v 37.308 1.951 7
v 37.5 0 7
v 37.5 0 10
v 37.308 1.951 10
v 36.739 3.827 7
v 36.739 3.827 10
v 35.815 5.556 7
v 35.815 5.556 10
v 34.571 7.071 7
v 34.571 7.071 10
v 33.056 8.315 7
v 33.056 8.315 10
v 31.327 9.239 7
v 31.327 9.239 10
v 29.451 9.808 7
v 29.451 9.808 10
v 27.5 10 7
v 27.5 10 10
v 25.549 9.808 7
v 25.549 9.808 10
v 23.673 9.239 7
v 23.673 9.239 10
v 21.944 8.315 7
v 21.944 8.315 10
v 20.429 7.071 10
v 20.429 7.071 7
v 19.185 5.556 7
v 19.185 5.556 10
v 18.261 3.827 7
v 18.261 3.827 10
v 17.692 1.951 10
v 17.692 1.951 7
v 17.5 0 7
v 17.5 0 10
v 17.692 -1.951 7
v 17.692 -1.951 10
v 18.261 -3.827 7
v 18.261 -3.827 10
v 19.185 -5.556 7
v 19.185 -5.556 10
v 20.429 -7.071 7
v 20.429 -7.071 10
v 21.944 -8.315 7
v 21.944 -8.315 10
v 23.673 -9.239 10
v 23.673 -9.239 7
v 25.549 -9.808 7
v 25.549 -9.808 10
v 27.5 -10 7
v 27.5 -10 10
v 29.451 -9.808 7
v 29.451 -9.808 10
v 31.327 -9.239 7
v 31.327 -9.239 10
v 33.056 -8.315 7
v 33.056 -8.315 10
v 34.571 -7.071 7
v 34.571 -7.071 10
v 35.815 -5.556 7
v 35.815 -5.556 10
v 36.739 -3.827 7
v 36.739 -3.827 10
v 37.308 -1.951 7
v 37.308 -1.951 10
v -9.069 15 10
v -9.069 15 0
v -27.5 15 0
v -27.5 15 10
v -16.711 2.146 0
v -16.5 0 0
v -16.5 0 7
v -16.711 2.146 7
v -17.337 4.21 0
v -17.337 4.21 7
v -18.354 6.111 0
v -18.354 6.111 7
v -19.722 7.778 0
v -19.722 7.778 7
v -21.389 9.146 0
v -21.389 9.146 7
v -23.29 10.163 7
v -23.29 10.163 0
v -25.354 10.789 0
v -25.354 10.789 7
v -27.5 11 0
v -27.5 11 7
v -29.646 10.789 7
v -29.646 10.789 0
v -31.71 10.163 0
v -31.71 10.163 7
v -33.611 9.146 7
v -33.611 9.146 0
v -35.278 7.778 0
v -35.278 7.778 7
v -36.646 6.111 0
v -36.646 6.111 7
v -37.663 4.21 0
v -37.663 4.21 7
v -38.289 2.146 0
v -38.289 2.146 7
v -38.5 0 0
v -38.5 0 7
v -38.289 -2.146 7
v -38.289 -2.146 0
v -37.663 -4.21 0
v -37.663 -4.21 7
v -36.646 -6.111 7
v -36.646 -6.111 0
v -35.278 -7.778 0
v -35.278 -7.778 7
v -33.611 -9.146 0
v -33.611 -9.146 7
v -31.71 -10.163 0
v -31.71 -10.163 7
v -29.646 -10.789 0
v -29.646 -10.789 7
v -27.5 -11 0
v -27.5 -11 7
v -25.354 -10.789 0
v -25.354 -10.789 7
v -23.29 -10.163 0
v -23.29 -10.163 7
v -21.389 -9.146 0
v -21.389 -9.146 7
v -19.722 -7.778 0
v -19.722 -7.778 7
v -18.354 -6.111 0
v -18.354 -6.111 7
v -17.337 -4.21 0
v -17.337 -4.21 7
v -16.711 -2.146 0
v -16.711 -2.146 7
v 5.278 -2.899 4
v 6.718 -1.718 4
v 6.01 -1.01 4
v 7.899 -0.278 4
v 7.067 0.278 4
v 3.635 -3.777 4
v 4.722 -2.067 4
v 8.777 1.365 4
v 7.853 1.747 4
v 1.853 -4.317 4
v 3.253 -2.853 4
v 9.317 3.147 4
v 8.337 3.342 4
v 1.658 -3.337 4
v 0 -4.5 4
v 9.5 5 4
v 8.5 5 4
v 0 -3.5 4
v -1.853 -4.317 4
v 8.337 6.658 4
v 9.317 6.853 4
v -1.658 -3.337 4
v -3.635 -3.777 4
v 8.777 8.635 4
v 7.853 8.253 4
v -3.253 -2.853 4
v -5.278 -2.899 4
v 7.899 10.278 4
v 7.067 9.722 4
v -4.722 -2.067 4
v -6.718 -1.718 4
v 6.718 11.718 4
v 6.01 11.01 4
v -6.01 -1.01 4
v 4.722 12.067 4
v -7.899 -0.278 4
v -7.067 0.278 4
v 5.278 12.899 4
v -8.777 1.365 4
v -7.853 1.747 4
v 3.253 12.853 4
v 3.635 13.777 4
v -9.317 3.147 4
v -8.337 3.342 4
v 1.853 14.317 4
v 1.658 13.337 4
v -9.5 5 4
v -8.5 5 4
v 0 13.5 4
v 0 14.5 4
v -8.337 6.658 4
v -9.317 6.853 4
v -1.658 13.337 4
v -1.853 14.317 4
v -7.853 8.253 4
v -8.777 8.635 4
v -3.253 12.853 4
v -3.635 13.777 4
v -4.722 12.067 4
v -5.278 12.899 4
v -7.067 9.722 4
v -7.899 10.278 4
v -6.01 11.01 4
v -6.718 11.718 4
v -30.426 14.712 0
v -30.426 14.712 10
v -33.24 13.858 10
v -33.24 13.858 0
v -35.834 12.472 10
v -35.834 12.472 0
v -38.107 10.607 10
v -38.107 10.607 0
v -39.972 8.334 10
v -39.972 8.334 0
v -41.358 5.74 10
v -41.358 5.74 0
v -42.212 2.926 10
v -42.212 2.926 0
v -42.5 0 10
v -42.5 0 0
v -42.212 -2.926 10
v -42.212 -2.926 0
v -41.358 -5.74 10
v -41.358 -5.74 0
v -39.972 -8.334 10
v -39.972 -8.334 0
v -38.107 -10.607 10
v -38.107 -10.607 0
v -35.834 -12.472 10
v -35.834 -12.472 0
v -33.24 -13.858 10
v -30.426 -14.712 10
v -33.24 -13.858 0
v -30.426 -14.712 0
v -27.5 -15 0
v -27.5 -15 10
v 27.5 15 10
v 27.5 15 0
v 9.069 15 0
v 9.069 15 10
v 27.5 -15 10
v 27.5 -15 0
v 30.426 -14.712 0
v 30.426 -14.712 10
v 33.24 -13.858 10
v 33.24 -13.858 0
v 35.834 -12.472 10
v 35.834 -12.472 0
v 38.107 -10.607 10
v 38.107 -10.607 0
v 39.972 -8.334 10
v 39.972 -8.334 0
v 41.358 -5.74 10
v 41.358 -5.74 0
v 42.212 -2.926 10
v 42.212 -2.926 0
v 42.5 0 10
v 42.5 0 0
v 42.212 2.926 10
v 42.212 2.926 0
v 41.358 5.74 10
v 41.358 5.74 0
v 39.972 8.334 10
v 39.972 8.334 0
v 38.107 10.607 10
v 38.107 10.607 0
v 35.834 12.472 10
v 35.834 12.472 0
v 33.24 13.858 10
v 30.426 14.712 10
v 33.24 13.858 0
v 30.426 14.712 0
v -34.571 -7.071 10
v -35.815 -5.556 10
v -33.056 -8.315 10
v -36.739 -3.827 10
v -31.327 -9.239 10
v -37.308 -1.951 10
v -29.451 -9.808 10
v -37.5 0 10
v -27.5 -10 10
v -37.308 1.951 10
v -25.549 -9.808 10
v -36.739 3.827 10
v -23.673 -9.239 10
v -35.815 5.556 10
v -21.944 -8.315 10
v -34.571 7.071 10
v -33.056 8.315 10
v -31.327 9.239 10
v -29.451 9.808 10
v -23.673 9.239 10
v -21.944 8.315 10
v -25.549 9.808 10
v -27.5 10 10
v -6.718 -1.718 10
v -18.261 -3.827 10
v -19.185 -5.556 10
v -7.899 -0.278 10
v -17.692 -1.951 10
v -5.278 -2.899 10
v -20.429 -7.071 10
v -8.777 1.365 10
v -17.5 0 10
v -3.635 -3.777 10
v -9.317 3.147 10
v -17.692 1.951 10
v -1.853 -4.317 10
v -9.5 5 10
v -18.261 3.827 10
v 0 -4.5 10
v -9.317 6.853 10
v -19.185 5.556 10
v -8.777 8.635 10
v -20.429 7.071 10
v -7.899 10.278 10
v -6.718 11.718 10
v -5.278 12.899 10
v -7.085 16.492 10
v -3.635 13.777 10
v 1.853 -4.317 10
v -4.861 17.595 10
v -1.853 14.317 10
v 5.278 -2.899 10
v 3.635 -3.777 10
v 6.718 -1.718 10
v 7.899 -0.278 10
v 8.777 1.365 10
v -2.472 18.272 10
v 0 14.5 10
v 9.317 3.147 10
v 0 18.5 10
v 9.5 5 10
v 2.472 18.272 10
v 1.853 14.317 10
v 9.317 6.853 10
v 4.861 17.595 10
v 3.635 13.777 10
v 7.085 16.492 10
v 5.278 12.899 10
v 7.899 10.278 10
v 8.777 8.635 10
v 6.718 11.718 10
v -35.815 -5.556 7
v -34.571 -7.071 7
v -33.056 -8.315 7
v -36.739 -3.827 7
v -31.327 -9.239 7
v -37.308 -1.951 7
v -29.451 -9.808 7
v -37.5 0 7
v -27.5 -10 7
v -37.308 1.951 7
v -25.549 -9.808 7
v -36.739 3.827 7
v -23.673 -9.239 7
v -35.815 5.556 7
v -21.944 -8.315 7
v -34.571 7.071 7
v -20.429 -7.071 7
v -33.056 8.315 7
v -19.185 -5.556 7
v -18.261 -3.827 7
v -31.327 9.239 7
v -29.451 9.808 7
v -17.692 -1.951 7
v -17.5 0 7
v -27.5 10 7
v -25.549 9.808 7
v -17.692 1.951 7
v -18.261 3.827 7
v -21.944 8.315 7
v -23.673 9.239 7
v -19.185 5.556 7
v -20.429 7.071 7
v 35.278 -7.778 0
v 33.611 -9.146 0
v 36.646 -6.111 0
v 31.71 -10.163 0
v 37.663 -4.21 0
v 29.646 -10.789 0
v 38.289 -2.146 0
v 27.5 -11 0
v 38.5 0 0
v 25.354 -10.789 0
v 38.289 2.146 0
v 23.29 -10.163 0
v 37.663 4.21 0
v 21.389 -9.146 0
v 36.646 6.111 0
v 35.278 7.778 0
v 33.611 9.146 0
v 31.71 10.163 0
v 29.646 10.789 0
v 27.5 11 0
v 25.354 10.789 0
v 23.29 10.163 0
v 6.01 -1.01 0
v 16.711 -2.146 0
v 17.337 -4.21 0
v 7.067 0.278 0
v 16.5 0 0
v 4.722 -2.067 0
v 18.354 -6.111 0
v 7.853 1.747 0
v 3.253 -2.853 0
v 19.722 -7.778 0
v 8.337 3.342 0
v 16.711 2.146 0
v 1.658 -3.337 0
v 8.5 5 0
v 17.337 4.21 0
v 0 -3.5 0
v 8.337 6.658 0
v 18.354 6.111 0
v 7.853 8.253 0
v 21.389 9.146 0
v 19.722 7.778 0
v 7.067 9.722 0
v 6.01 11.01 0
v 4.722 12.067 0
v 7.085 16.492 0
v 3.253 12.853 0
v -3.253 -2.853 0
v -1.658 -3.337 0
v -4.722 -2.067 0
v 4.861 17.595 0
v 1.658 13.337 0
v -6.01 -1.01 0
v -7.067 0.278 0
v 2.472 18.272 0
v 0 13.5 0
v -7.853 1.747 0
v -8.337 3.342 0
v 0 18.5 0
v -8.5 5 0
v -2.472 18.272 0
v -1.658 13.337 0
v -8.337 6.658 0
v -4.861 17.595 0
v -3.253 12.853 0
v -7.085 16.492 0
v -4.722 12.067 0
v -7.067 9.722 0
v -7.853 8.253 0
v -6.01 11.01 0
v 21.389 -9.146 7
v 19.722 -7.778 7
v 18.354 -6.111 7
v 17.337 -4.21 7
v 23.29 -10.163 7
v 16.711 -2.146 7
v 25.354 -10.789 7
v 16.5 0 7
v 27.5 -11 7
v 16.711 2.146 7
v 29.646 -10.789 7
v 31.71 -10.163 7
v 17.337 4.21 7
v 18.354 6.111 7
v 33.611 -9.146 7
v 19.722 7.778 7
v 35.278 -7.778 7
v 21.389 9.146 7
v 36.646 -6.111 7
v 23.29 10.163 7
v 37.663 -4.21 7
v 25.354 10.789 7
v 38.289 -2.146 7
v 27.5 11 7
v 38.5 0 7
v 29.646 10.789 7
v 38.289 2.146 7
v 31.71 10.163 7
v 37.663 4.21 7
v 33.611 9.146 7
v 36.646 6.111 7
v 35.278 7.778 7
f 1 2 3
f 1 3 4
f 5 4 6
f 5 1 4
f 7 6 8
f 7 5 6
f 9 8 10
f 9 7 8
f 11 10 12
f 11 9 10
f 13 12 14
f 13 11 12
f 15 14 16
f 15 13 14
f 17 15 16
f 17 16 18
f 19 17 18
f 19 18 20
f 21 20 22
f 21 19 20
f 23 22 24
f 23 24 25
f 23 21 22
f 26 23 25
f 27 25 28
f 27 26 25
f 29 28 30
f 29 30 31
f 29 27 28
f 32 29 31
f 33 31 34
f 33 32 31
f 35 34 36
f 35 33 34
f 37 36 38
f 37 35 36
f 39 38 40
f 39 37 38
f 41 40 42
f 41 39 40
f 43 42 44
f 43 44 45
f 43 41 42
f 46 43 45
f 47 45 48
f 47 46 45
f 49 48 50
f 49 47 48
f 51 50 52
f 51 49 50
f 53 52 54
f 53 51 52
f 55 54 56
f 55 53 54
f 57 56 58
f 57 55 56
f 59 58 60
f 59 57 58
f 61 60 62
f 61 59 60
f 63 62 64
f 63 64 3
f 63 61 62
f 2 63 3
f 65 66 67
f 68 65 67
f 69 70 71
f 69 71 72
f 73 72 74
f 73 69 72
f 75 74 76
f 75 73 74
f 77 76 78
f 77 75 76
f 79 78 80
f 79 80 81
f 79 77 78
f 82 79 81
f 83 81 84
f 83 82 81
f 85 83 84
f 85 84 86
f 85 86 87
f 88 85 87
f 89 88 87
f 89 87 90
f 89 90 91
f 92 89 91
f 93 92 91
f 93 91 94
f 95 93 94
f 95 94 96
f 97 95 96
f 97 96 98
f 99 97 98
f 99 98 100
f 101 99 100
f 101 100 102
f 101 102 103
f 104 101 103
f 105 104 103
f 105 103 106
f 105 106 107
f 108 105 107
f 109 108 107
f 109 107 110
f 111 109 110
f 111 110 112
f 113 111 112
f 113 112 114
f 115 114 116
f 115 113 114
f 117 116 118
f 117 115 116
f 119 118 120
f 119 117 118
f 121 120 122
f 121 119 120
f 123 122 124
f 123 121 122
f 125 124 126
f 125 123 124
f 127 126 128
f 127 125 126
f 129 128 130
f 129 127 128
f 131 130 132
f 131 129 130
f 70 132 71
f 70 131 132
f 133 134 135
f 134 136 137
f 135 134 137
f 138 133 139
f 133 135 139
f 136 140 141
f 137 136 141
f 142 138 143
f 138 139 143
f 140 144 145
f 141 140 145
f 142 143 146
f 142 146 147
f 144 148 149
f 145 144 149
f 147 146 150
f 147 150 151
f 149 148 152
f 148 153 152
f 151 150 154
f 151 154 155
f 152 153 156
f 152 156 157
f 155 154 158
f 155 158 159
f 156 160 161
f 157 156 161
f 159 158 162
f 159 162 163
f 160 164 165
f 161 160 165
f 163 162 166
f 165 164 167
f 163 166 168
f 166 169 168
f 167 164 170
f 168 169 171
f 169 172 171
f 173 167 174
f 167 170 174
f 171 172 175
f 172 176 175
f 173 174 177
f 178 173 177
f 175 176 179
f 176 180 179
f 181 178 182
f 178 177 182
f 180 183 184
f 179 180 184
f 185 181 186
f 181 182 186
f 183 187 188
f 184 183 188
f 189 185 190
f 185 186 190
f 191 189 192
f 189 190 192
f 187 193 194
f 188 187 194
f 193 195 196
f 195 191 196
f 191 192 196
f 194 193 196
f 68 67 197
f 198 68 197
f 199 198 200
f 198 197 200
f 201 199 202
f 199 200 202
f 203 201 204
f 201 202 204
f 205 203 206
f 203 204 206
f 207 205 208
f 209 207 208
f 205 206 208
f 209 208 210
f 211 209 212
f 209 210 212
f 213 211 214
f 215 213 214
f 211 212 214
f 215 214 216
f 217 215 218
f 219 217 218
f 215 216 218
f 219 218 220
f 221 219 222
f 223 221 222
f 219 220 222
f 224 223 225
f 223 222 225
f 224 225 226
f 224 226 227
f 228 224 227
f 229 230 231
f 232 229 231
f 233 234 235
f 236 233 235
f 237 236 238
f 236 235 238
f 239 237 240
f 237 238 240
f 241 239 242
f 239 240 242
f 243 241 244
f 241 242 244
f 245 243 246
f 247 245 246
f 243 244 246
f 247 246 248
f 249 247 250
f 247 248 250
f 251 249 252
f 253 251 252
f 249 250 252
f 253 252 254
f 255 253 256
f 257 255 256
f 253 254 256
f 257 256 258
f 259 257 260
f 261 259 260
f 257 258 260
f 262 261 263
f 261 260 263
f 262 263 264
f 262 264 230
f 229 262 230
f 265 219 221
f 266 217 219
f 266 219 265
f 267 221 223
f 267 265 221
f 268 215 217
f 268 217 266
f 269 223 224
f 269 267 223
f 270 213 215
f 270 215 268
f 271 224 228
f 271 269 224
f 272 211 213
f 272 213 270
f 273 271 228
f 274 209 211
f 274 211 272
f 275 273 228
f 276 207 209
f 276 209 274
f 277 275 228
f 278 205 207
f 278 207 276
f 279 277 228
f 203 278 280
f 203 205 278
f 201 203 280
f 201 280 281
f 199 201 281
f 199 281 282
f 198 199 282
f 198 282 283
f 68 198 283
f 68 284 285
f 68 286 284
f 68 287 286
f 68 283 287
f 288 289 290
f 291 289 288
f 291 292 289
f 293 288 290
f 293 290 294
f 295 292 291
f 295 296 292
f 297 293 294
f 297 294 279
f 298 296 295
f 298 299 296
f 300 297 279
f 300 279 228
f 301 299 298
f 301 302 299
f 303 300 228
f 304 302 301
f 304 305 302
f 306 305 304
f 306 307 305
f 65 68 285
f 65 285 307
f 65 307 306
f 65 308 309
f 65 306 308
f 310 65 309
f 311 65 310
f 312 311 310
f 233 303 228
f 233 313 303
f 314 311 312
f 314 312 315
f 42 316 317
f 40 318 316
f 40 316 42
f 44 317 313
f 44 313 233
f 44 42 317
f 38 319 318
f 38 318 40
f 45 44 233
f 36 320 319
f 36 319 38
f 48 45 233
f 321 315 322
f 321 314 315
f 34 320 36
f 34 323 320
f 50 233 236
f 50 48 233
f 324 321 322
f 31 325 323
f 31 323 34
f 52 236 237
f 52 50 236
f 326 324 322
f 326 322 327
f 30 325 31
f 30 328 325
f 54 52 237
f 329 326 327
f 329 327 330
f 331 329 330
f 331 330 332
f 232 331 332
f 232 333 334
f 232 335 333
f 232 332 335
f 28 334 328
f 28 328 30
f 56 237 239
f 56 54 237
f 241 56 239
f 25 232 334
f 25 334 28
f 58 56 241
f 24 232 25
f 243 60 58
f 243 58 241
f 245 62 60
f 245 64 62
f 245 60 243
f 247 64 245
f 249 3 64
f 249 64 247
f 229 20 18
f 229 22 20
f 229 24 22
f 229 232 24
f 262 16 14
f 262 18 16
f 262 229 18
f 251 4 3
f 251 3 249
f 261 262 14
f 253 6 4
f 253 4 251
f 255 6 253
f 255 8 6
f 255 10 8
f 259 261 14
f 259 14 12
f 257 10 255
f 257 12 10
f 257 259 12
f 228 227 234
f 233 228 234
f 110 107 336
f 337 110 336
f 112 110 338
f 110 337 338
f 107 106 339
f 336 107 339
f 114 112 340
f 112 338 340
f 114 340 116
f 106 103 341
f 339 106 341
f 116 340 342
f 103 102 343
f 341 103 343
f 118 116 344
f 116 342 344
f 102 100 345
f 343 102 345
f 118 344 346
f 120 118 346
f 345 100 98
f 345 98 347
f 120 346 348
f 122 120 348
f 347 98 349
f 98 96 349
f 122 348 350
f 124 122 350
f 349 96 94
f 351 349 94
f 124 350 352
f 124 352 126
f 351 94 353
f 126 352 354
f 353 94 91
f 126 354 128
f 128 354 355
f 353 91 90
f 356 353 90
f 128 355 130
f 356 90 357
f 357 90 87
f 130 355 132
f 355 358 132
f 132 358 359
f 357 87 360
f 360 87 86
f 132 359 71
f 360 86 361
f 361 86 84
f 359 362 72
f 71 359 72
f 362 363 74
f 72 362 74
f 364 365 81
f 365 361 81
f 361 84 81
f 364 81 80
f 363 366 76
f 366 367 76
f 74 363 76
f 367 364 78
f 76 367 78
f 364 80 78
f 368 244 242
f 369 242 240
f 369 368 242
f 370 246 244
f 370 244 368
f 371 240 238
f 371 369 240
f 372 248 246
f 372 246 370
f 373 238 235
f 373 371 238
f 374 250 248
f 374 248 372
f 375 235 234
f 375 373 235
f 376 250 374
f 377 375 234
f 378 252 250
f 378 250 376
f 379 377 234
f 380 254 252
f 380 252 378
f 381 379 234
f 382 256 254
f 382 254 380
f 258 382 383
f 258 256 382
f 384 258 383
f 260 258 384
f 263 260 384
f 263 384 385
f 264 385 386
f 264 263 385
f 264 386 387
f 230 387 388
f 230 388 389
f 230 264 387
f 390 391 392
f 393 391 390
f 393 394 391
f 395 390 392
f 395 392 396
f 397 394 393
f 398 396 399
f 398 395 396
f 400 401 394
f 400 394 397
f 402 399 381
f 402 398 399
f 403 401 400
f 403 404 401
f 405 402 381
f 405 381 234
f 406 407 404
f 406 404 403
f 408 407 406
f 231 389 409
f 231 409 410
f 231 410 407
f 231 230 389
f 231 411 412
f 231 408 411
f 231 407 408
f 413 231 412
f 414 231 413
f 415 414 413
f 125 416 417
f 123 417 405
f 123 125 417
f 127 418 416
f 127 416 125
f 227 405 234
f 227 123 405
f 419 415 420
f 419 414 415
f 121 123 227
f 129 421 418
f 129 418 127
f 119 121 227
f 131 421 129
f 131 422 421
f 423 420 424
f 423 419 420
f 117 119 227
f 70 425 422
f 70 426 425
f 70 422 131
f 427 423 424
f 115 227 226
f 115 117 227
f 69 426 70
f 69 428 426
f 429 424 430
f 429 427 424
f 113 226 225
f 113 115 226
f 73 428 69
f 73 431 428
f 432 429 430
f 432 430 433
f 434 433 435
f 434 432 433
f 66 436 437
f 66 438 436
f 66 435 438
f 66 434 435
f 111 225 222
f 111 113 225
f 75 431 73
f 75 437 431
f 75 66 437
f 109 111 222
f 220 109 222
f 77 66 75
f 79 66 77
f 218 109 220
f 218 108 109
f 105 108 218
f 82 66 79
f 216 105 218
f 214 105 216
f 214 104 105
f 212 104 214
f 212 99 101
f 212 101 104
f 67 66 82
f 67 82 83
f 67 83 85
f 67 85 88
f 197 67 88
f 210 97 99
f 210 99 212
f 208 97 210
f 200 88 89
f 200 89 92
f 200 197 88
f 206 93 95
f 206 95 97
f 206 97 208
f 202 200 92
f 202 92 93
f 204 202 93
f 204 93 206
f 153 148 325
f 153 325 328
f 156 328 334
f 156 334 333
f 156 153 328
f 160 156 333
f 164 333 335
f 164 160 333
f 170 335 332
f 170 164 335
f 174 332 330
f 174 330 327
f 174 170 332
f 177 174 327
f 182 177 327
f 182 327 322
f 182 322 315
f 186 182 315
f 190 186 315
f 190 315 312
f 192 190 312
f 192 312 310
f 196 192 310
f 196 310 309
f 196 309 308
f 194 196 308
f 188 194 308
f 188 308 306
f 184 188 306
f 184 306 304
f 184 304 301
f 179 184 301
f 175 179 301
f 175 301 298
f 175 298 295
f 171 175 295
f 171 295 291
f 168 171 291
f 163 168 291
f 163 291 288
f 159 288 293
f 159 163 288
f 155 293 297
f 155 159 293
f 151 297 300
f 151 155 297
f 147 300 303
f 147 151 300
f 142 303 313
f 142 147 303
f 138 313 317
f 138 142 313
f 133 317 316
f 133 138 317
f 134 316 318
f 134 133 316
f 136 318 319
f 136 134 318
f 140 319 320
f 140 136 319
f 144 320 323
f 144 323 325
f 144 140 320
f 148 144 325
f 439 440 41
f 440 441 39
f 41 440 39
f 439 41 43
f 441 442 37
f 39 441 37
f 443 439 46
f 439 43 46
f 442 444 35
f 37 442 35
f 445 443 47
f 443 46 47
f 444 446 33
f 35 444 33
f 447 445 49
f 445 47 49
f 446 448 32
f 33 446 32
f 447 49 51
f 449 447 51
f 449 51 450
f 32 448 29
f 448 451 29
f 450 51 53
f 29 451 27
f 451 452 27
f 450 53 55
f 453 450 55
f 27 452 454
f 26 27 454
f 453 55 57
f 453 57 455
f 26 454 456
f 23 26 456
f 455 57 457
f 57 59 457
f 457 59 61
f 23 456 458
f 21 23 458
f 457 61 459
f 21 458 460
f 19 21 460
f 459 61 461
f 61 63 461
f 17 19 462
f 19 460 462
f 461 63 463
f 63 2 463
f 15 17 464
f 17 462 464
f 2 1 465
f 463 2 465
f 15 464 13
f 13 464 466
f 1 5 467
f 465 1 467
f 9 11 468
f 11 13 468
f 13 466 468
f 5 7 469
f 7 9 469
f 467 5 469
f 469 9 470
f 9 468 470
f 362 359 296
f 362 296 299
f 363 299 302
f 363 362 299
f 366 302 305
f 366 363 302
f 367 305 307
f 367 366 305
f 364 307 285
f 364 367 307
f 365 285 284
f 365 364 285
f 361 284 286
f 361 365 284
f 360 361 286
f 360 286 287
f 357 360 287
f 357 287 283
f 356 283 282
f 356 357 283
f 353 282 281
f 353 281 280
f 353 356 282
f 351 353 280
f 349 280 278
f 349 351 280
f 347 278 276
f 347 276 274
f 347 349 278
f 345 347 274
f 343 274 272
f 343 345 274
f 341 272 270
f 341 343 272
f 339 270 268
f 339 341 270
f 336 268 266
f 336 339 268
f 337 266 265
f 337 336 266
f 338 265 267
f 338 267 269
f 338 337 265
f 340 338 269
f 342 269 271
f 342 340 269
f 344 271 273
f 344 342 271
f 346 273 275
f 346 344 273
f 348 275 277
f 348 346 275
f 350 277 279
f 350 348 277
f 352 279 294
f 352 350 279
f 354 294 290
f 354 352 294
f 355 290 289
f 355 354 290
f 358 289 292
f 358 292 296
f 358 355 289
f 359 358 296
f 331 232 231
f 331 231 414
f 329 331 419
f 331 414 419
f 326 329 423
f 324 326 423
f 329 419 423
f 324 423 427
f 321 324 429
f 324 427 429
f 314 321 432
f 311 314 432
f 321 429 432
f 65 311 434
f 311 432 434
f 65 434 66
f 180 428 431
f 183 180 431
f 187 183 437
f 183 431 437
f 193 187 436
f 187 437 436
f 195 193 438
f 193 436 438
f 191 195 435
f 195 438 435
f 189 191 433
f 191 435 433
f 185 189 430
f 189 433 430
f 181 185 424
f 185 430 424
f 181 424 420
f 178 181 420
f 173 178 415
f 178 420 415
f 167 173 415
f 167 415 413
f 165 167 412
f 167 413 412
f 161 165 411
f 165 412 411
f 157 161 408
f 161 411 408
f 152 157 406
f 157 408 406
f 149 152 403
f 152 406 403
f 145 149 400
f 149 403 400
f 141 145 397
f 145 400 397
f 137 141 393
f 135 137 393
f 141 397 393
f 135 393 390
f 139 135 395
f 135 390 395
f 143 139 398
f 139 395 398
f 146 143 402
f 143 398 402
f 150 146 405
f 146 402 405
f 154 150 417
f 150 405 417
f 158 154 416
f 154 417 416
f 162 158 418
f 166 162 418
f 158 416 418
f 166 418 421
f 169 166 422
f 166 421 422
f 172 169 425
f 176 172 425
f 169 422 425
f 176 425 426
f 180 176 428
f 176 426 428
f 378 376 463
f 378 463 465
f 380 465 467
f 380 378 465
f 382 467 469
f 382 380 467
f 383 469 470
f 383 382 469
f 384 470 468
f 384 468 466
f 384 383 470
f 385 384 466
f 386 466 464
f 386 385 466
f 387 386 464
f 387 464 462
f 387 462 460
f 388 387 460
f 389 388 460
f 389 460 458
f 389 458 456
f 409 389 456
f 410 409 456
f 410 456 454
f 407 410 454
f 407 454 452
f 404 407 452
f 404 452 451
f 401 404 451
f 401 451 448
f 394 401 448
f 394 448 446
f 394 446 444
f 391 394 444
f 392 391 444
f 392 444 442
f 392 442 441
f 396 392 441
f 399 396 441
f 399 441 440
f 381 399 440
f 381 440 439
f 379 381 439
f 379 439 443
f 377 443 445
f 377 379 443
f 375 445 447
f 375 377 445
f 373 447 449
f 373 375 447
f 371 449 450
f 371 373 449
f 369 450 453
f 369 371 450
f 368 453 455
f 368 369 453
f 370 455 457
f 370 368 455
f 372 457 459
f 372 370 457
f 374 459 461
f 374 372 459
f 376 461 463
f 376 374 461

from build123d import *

# Parameters (mm, degrees)
SKETCH1_R           = 11
SKETCH1_R_2         = 9.5
BOSS_EXTRUDE1_DEPTH = 10
BOSS_EXTRUDE2_START = -3
SKETCH2_R           = 11
SKETCH2_R_2         = 10
BOSS_EXTRUDE2_DEPTH = 3
SKETCH4_R           = 9.5
SKETCH4_R_2         = 8.5
BOSS_EXTRUDE3_DEPTH = 4


with BuildPart() as part:
    # Sketch1 → Boss-Extrude1 (new body)
    with BuildSketch(Plane.XY):
        with BuildLine():
            Line((-27.5, -15), (27.5, -15))
            ThreePointArc((27.5, -15), (42.5, 0), (27.5, 15))
            Line((27.5, 15), (9.069178574, 15))
            ThreePointArc((9.069178574, 15), (0, 18.5), (-9.069178574, 15))
            Line((-9.069178574, 15), (-27.5, 15))
            ThreePointArc((-27.5, 15), (-42.5, 0), (-27.5, -15))
        make_face()
        with Locations((-27.5, 0)):
            Circle(SKETCH1_R, mode=Mode.SUBTRACT)
        with Locations((27.5, 0)):
            Circle(SKETCH1_R, mode=Mode.SUBTRACT)
        with Locations((0, 5)):
            Circle(SKETCH1_R_2, mode=Mode.SUBTRACT)
    extrude(amount=BOSS_EXTRUDE1_DEPTH)

    # Sketch2 → Boss-Extrude2 (add)
    # profile 1 of 2: a face of its own
    with BuildSketch(Plane.XY.offset(10).offset(BOSS_EXTRUDE2_START)):
        with Locations((-27.5, 0)):
            Circle(SKETCH2_R)
        with Locations((-27.5, 0)):
            Circle(SKETCH2_R_2, mode=Mode.SUBTRACT)
    # profile 2 of 2: a face of its own
    with BuildSketch(Plane.XY.offset(10).offset(BOSS_EXTRUDE2_START)):
        with Locations((27.5, 0)):
            Circle(SKETCH2_R)
        with Locations((27.5, 0)):
            Circle(SKETCH2_R_2, mode=Mode.SUBTRACT)
    extrude(amount=BOSS_EXTRUDE2_DEPTH)

    # Sketch4 → Boss-Extrude3 (add)
    with BuildSketch(Plane(origin=(0, 0, 0), x_dir=(-1, 0, 0), z_dir=(0, 0, -1))):
        with Locations((0, 5)):
            Circle(SKETCH4_R)
        with Locations((0, 5)):
            Circle(SKETCH4_R_2, mode=Mode.SUBTRACT)
    extrude(amount=-BOSS_EXTRUDE3_DEPTH)


solid = part.part
